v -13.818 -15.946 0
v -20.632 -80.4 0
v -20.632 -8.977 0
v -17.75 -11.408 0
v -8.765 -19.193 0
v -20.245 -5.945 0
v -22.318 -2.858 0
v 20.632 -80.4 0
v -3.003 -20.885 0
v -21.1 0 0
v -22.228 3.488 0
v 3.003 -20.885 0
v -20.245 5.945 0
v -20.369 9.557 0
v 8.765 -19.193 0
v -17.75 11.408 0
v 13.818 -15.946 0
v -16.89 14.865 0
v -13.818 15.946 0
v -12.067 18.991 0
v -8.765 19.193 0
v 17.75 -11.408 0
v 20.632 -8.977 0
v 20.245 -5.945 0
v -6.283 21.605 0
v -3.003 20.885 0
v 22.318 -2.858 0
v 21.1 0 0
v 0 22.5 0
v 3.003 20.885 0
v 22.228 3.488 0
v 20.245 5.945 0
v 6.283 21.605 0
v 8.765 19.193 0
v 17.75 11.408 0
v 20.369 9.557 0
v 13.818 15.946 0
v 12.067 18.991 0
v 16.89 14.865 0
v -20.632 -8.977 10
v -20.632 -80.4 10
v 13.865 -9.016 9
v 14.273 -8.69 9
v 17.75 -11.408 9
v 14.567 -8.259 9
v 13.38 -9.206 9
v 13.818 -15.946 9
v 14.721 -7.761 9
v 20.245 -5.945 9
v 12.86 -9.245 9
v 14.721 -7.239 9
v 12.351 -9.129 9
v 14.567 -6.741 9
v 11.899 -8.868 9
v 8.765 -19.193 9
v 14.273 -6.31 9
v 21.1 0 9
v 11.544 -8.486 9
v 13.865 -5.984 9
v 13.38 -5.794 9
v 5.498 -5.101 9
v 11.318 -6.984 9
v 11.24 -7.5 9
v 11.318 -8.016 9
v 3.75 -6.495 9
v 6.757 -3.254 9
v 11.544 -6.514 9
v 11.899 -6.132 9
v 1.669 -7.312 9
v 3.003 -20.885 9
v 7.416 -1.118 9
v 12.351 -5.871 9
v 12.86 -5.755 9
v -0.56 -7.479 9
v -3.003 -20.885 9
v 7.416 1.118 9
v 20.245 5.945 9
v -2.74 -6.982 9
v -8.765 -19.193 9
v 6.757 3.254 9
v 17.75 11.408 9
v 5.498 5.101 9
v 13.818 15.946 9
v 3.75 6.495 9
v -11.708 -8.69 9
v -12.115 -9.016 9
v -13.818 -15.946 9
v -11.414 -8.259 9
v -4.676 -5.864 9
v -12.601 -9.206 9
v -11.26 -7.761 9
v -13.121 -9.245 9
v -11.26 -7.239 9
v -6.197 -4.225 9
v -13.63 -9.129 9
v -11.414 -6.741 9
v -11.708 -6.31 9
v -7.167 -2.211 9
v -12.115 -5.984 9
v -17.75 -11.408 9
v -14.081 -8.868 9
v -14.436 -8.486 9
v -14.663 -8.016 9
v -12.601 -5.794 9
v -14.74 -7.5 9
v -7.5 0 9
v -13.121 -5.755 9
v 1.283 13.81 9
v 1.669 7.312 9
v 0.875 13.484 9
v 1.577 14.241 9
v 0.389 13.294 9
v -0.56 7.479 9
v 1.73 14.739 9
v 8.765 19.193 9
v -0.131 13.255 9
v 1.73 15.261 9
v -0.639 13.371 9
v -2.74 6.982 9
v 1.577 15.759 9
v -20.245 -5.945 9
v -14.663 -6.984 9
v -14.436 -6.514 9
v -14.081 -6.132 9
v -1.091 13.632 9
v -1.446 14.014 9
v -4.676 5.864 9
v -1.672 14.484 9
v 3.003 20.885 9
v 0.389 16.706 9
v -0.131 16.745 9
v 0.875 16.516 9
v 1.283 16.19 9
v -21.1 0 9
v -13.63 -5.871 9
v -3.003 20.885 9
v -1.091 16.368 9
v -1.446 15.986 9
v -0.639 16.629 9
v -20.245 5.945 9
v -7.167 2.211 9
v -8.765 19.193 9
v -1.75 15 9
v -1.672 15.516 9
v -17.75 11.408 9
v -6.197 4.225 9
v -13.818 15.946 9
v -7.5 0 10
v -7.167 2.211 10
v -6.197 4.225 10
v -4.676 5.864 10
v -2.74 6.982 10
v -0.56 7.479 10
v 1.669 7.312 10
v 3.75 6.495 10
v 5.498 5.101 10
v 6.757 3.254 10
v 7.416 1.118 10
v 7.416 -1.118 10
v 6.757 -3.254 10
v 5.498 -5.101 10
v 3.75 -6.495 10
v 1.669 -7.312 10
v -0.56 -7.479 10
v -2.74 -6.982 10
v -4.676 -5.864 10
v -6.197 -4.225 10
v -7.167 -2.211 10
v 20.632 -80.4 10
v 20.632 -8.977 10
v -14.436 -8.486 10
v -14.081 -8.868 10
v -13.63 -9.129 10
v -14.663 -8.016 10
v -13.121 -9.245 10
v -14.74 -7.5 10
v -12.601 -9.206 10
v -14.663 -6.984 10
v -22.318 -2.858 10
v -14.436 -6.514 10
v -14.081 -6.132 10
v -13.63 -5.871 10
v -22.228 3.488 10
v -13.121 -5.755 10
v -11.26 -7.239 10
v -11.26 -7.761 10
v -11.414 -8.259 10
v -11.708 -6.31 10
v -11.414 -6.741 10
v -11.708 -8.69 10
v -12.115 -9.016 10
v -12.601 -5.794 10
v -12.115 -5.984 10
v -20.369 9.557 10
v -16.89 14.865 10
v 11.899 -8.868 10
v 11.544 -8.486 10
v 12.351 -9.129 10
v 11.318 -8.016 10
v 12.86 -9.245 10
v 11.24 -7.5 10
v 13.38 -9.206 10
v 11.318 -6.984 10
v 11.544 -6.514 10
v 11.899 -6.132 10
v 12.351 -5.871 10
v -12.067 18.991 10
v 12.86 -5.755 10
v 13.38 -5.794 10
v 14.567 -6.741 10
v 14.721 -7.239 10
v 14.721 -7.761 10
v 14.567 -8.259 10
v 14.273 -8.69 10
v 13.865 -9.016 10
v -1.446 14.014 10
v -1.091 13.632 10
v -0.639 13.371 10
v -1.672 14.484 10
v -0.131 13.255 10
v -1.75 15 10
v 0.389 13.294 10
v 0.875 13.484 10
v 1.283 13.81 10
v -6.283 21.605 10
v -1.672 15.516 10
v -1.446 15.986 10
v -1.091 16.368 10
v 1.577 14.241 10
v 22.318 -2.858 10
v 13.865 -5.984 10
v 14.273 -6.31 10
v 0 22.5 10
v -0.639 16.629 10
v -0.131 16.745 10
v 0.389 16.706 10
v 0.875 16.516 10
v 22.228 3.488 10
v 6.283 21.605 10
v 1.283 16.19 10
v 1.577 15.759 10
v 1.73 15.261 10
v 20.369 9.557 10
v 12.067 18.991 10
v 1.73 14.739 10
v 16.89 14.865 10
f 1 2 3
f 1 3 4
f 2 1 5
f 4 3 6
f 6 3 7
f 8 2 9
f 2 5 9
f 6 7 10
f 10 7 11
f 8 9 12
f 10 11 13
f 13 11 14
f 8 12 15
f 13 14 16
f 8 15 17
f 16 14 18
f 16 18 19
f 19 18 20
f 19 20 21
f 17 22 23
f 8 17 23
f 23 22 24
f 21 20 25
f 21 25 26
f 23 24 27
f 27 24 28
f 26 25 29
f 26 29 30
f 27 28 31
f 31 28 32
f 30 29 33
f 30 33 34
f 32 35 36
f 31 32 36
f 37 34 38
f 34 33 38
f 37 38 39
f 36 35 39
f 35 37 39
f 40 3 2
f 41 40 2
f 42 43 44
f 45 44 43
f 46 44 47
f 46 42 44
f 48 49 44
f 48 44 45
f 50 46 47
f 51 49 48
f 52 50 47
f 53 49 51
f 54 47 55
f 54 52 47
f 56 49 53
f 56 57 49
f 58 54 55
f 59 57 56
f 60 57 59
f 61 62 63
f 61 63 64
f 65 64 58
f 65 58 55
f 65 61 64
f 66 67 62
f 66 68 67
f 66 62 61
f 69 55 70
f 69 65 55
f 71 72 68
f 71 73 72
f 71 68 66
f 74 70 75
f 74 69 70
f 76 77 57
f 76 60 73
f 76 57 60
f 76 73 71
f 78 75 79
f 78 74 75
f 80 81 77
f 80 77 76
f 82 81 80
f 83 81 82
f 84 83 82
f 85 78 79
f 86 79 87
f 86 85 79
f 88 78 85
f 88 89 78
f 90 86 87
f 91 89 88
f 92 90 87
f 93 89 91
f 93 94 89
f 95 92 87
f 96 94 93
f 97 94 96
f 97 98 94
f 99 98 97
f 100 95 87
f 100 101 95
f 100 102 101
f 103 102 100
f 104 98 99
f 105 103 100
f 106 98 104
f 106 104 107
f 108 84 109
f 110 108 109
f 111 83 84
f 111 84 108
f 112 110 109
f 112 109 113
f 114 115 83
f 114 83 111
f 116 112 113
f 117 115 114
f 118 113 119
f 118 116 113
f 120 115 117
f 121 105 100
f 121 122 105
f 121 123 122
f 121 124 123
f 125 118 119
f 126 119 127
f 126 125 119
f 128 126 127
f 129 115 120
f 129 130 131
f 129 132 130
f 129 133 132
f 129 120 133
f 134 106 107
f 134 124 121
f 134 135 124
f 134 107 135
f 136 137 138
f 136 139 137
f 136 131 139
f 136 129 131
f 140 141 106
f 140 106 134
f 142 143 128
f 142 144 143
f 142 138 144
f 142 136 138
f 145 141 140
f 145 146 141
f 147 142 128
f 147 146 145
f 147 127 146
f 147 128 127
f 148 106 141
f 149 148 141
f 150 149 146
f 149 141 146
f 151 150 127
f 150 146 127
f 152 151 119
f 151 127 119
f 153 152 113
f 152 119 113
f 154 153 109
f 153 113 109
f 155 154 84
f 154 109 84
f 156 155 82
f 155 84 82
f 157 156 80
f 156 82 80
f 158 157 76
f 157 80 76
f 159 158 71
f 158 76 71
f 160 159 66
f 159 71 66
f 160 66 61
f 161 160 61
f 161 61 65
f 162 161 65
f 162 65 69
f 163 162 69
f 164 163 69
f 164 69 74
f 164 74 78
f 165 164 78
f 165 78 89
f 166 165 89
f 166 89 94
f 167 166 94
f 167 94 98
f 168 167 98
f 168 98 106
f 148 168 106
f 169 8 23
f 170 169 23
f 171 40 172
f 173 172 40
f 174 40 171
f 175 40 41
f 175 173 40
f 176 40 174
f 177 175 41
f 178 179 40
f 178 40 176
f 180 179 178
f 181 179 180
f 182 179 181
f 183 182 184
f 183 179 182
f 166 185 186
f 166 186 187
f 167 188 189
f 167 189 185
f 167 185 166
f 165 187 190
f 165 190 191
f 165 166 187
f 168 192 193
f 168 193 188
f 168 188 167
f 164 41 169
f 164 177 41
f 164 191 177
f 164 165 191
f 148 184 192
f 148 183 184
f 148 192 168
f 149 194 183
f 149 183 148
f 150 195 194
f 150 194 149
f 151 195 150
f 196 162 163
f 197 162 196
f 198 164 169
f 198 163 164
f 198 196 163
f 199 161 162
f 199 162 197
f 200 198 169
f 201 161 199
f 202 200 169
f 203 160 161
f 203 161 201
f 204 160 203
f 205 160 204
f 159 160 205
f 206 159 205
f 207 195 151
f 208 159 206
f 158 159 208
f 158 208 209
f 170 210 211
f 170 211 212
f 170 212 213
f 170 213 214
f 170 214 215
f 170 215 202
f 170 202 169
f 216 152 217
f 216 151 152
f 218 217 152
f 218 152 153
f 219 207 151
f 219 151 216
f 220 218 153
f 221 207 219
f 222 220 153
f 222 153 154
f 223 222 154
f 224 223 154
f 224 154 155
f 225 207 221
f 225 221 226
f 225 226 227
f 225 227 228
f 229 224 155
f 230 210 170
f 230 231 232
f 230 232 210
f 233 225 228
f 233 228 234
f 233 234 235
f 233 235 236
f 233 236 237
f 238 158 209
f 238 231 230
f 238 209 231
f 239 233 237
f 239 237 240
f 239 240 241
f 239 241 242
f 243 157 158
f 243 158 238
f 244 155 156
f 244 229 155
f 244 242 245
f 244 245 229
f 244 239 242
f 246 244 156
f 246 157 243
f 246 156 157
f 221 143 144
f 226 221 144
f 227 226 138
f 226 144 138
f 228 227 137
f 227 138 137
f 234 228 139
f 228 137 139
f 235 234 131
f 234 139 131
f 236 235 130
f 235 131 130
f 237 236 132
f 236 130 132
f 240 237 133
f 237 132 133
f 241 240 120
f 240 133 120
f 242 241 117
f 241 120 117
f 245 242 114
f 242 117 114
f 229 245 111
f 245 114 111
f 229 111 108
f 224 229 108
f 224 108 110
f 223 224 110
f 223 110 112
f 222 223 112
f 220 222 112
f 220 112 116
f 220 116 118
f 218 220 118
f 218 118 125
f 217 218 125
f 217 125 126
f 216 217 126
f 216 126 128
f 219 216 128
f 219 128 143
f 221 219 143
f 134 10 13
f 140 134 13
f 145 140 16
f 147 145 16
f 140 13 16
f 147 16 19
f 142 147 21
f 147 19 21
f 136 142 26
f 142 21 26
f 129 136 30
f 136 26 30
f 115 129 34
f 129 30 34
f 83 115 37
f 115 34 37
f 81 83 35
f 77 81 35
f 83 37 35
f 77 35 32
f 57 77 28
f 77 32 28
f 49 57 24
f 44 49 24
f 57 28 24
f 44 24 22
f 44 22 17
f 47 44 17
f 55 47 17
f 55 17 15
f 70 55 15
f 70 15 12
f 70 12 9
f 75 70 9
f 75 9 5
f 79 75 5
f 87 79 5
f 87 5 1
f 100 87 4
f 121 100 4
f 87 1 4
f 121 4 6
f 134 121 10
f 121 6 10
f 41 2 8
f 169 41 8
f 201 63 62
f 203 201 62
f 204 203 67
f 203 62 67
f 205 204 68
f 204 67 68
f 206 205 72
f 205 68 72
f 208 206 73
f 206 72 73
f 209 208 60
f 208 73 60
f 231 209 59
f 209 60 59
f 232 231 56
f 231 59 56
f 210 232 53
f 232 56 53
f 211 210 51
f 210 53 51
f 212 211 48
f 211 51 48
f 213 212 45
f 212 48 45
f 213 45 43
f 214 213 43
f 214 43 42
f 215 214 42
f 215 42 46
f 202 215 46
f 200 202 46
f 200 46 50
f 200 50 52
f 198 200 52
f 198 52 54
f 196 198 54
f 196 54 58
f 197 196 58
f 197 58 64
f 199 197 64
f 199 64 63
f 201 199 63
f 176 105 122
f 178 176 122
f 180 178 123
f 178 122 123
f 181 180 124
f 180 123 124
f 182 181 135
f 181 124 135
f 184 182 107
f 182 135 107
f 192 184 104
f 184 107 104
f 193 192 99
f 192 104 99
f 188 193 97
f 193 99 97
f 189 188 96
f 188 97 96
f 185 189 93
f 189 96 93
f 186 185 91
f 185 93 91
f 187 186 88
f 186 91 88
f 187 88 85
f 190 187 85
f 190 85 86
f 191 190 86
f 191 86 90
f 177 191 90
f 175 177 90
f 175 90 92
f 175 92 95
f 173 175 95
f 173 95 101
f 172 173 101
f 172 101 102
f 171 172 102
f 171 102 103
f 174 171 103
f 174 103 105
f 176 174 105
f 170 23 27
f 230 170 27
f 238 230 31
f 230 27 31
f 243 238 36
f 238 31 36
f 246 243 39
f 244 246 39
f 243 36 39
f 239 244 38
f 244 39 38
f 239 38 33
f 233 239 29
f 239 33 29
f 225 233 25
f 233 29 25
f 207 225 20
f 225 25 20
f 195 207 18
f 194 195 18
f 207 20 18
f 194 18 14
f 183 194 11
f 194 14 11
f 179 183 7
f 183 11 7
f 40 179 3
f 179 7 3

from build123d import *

# Parameters (mm, degrees)
BOSS_EXTRUDE1_DEPTH = 10
SKETCH2_R           = 1.75
CUT_EXTRUDE1_DEPTH  = 10
SKETCH3_R           = 21.1
CUT_EXTRUDE2_DEPTH  = 9
SKETCH4_R           = 7.5
CUT_EXTRUDE3_DEPTH  = 10


with BuildPart() as part:
    # Sketch1 → Boss-Extrude1 (new body)
    with BuildSketch(Plane.XY):
        with BuildLine():
            Line((-20.631764929, -8.976651708), (-20.631764929, -80.4))
            Line((-20.631764929, -80.4), (20.631764929, -80.4))
            Line((20.631764929, -80.4), (20.631764929, -8.976651708))
            ThreePointArc((20.631764929, -8.976651708), (0, 22.5), (-20.631764929, -8.976651708))
        make_face()
    extrude(amount=BOSS_EXTRUDE1_DEPTH)

    # Sketch2 → Cut-Extrude1 (cut)
    with BuildSketch(Plane(origin=(0, 0, 0), x_dir=(-1, 0, 0), z_dir=(0, 0, -1))):
        with Locations((0, 15)):
            Circle(SKETCH2_R)
        with Locations((12.990381057, -7.5)):
            Circle(SKETCH2_R)
        with Locations((-12.990381057, -7.5)):
            Circle(SKETCH2_R)
    extrude(amount=-CUT_EXTRUDE1_DEPTH, mode=Mode.SUBTRACT)

    # Sketch3 → Cut-Extrude2 (cut)
    with BuildSketch(Plane(origin=(0, 0, 0), x_dir=(-1, 0, 0), z_dir=(0, 0, -1))):
        Circle(SKETCH3_R)
    extrude(amount=-CUT_EXTRUDE2_DEPTH, mode=Mode.SUBTRACT)

    # Sketch4 → Cut-Extrude3 (cut)
    with BuildSketch(Plane(origin=(0, 0, 0), x_dir=(-1, 0, 0), z_dir=(0, 0, -1))):
        Circle(SKETCH4_R)
    extrude(amount=-CUT_EXTRUDE3_DEPTH, mode=Mode.SUBTRACT)


solid = part.part
